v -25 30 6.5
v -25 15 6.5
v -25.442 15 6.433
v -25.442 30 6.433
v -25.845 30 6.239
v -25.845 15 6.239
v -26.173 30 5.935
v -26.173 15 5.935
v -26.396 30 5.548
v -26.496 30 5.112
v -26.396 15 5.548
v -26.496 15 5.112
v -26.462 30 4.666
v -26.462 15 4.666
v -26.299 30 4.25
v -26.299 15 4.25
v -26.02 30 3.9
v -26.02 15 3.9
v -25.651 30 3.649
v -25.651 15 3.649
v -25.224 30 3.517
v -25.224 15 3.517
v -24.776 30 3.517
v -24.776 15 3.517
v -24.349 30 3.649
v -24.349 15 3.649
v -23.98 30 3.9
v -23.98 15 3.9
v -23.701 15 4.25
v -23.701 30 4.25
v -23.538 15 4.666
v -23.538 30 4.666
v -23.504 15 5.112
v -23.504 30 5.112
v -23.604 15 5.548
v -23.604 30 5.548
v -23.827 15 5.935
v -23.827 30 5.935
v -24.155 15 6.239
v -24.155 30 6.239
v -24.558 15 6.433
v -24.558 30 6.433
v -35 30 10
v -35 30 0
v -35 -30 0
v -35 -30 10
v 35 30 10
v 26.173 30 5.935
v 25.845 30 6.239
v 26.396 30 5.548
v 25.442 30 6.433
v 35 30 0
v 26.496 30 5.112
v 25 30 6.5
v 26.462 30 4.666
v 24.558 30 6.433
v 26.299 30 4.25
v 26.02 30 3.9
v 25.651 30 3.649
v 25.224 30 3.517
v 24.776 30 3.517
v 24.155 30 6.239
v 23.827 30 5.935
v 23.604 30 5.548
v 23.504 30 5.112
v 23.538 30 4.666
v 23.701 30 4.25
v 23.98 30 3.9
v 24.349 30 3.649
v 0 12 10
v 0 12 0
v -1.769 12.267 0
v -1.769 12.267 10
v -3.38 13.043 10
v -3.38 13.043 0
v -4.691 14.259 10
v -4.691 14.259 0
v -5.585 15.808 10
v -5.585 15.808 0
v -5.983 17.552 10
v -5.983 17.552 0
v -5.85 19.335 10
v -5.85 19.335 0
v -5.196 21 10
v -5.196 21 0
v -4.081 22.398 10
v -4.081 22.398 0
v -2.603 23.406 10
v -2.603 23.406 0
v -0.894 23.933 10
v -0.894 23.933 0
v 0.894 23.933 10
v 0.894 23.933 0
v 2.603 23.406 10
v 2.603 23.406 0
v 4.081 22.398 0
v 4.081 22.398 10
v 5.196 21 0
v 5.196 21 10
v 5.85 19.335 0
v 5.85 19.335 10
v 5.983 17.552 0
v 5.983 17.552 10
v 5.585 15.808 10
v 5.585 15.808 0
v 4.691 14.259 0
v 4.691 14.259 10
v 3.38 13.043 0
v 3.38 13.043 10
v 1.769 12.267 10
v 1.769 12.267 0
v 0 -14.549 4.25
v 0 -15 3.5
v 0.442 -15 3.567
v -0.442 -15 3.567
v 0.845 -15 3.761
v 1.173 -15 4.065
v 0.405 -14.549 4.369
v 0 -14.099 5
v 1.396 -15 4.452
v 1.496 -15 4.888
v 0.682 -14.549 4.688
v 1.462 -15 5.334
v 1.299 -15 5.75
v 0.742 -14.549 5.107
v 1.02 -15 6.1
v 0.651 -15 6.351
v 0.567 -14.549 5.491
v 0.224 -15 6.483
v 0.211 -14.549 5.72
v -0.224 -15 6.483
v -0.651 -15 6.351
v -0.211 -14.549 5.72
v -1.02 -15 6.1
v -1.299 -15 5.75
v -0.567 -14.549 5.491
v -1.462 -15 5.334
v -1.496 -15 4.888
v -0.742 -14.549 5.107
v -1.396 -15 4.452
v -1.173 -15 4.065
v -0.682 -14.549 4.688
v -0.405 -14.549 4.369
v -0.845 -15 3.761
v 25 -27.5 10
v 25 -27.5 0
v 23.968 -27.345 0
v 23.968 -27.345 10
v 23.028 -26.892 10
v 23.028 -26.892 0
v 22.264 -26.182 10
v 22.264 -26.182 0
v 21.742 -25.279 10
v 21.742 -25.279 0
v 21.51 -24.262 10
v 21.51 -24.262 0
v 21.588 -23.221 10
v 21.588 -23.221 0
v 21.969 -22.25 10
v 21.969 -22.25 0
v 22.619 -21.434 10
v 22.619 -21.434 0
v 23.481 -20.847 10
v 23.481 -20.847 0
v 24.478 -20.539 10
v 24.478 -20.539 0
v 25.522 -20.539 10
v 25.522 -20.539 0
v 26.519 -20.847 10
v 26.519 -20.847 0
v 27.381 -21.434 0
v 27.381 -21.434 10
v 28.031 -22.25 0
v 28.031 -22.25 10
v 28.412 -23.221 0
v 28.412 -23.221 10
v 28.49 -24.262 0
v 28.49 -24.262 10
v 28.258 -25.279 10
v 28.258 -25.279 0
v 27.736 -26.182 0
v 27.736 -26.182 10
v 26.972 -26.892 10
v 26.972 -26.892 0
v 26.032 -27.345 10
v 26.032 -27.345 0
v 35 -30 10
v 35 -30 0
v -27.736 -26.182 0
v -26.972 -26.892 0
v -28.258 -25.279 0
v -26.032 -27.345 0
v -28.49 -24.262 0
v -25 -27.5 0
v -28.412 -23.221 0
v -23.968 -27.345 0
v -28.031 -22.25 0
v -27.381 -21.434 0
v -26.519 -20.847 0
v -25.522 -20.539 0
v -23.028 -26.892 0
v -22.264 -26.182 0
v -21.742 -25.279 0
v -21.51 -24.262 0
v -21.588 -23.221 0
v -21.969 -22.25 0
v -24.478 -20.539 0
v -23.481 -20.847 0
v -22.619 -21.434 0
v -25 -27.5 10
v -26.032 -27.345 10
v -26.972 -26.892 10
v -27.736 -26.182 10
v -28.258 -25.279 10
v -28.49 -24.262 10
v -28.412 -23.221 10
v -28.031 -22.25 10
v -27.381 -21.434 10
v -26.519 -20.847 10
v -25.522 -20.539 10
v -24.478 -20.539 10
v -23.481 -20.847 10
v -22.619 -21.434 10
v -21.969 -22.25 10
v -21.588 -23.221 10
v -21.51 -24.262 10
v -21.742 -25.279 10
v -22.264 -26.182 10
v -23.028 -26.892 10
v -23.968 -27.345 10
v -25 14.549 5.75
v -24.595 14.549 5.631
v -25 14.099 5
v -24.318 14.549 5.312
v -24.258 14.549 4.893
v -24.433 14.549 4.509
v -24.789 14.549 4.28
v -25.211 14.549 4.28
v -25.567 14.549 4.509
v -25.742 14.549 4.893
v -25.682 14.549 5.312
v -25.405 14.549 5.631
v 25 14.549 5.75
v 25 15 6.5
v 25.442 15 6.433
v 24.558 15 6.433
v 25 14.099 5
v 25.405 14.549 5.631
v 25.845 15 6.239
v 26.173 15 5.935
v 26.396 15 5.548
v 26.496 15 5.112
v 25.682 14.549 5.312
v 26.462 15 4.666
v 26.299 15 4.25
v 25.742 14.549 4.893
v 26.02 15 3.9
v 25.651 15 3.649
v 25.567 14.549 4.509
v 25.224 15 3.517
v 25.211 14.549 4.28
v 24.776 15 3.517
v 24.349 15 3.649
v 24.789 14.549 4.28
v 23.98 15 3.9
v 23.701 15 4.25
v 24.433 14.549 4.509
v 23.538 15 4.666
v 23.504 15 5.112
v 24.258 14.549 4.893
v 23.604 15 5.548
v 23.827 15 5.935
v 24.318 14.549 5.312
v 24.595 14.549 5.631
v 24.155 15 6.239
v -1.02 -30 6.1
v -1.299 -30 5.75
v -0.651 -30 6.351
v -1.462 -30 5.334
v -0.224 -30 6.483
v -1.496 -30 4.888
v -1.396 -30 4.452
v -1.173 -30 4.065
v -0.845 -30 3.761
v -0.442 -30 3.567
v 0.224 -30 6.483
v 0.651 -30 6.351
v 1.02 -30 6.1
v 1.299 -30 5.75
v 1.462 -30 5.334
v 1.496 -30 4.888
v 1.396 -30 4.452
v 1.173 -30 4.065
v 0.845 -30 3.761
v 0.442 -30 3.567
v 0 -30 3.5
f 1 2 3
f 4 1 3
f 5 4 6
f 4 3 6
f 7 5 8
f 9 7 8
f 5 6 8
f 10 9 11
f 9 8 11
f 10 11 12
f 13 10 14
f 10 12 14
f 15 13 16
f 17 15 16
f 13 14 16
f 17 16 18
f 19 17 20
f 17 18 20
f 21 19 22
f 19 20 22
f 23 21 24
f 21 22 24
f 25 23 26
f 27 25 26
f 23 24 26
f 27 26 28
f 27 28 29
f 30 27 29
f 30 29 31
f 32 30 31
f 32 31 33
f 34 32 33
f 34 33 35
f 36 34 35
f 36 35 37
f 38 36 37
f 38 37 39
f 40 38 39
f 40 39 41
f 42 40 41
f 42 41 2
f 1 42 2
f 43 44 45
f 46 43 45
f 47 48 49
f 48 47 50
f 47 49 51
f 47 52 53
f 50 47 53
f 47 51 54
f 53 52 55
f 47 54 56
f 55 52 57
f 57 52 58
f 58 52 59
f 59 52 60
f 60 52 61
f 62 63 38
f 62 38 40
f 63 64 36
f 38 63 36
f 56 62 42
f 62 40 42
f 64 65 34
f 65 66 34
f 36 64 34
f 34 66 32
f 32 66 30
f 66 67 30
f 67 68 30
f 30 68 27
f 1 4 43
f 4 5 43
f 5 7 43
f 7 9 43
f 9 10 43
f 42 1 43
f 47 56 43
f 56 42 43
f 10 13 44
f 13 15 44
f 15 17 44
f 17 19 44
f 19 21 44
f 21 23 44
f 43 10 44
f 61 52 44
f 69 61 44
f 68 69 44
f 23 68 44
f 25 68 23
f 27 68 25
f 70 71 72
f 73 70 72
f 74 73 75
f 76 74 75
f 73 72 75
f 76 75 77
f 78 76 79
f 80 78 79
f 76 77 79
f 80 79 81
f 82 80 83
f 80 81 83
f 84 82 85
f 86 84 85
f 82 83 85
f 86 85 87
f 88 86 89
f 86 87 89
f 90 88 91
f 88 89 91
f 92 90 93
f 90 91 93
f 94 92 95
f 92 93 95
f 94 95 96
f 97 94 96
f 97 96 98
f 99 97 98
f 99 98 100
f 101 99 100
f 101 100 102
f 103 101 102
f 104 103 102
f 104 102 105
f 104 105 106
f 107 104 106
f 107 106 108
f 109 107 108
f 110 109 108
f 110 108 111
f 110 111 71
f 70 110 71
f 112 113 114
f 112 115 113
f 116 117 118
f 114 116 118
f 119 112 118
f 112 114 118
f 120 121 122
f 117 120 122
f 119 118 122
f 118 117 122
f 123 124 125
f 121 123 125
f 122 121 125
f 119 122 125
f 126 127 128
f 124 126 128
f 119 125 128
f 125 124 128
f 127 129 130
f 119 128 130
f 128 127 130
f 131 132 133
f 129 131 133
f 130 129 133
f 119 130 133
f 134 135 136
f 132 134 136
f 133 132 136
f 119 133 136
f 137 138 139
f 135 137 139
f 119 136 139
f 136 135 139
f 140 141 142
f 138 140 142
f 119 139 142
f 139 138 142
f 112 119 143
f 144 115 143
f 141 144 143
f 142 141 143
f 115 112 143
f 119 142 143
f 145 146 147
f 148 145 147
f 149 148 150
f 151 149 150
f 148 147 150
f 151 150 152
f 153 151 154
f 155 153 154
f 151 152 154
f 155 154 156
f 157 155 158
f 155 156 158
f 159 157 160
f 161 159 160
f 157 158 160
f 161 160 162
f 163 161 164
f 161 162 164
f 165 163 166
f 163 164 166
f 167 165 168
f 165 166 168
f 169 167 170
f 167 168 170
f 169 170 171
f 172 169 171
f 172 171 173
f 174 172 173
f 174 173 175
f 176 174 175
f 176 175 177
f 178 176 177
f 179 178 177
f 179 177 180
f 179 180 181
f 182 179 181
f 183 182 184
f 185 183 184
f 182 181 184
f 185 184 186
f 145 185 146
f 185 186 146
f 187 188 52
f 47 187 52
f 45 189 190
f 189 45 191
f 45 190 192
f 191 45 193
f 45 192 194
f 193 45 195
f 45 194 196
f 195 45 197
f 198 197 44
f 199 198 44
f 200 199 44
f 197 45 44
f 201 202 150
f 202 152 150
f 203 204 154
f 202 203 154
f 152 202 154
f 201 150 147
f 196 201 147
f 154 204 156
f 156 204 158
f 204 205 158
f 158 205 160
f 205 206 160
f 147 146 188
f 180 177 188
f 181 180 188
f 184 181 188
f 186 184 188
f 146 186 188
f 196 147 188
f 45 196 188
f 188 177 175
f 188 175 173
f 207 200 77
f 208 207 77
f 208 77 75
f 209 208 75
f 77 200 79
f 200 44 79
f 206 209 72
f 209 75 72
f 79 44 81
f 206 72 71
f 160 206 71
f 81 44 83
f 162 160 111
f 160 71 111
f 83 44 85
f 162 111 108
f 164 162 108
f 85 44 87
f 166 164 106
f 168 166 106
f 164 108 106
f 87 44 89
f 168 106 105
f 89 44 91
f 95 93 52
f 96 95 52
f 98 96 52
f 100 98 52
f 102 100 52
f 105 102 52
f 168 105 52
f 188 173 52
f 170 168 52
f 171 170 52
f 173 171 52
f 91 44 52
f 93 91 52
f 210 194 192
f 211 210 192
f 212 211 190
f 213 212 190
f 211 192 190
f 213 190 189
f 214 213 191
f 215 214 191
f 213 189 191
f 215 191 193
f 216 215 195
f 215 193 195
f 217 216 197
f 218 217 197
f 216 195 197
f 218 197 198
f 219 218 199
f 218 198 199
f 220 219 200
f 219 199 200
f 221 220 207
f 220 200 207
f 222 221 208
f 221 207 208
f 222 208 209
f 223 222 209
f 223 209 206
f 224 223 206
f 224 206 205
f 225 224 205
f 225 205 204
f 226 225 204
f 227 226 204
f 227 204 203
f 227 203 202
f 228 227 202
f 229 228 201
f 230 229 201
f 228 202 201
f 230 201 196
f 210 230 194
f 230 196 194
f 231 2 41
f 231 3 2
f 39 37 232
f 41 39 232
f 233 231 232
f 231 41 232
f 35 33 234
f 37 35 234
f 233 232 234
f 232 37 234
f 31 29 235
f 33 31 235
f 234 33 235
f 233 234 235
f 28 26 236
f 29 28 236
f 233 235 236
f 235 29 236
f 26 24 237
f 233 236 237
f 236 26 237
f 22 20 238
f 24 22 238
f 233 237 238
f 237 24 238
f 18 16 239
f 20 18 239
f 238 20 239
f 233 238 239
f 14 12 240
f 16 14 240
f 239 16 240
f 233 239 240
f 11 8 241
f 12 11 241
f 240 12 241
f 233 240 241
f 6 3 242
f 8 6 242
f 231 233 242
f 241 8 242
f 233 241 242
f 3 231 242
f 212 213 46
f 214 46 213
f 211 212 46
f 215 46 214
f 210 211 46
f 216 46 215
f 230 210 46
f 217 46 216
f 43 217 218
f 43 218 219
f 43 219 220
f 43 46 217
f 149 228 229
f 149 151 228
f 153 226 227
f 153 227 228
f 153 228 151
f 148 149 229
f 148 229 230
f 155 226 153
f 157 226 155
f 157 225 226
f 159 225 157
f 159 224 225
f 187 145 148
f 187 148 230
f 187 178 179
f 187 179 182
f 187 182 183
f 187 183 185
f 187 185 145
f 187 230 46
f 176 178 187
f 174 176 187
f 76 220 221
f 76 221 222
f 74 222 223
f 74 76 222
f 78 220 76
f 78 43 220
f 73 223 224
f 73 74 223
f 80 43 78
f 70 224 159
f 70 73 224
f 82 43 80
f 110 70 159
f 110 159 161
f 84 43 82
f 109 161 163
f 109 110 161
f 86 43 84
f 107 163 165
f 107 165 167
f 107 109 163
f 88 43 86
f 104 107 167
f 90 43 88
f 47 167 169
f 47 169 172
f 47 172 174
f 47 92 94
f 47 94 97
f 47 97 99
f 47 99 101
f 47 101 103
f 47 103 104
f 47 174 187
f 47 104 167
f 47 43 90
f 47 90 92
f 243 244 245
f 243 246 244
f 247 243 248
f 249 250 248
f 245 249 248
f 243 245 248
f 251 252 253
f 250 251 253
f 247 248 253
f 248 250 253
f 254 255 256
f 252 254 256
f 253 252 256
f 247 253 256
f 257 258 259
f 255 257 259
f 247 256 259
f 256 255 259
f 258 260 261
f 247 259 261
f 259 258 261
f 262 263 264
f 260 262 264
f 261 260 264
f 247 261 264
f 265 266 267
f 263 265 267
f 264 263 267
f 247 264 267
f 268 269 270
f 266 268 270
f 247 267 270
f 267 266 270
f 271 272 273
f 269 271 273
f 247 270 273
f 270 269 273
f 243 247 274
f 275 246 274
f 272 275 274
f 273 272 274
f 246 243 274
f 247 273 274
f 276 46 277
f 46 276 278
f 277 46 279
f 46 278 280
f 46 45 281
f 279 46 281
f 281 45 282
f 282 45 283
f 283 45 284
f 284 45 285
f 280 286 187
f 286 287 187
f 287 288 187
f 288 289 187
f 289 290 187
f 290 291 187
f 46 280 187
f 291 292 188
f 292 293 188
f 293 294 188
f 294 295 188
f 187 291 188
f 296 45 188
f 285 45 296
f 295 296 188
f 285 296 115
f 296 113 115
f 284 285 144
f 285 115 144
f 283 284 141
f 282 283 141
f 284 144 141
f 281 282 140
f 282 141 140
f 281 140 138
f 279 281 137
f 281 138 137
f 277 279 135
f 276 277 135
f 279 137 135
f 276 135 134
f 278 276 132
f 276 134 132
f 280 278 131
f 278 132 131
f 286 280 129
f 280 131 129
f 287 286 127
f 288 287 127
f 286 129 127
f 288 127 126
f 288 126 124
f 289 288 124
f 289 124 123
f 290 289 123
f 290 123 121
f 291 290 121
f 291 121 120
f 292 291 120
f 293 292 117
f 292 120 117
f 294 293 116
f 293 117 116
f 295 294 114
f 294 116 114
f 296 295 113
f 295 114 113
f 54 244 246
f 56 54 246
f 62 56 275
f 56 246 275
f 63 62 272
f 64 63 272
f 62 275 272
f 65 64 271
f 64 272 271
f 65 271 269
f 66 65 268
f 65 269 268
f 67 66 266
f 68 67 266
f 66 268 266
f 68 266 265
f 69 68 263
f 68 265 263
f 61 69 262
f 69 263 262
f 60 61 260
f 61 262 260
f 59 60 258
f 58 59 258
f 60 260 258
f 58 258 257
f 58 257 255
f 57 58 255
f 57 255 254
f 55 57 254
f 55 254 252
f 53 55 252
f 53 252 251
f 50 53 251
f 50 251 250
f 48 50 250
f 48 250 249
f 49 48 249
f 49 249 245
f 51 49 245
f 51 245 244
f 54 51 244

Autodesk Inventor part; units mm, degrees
ref_plane "YZ Plane" through (0, 0, 0) normal (1, 0, 0) x (0, 1, 0)
ref_plane "XZ Plane" through (0, 0, 0) normal (0, 1, 0) x (-1, 0, 0)
ref_plane "XY Plane" through (0, 0, 0) normal (0, 0, 1) x (1, 0, 0)
sketch "Skizze1" plane through (0, 0, 0) normal (0, 0, 1) x (1, 0, 0)
  line L0 (-35, -30) -> (35, -30)
  line L1 (35, -30) -> (35, 30)
  line L2 (35, 30) -> (-35, 30)
  line L3 (-35, 30) -> (-35, -30)
  line L4 (-35, -30) -> (35, 30) construction
  line L5 (35, -30) -> (-35, 30) construction
  point P0 (0, 0)
  dimension "Breite" = 70
  dimension "Länge" = 60
extrude "Extrusion1" add sketch "Skizze1" along normal blind 10
sketch "Skizze2" plane through (0, 0, 10) normal (0, 0, 1) x (1, 0, 0)
  line L0 (-35, -30) -> (35, -30) projected
  line L1 (0, -42) -> (0, 42) projected
  point P0 (0, 0)
  point P1 (-25, -24)
  point P2 (25, -24)
  point P3 (0, 18)
  dimension "Abstand_bohrung_unten" = 6
  dimension "Abstand_Bohrung_oben" = 48
hole "Bohrung1" at (25, -24, 10) at (-25, -24, 10) direction (0, 0, -1) diameter 7 end through all
hole "Bohrung2" at (0, 18, 10) direction (0, 0, -1) diameter 12 end through all
sketch "Skizze5" plane through (-35, 30, 0) normal (0, 1, 0) x (1, 0, 0)
  line L0 (70, -10) -> (0, -10) projected
  line L1 (0, 0) -> (0, -10) projected
  line L2 (70, 0) -> (70, -10) projected
  point P0 (35, 0)
  point P1 (60, -5)
  point P2 (10, -5)
  dimension "d36" = 5
  dimension "d37" = 50
  dimension "d38" = 10
  dimension "d39" = 10
hole "Bohrung5" at (25, 30, 5) at (-25, 30, 5) direction (0, -1, 0) diameter 3 depth 15 tip angle 118
sketch "Skizze6" plane through (-35, -30, 0) normal (0, -1, 0) x (1, 0, 0)
  line L0 (0, 10) -> (70, 10) projected
  line L1 (70, 0) -> (70, 10) projected
  point P0 (35, 0)
  point P1 (35, 5)
  dimension "d47" = 5
  dimension "d48" = 35
hole "Bohrung6" at (0, -30, 5) direction (0, 1, 0) diameter 3 depth 15 tip angle 118
properties part number "ABI_Grundplatte"
